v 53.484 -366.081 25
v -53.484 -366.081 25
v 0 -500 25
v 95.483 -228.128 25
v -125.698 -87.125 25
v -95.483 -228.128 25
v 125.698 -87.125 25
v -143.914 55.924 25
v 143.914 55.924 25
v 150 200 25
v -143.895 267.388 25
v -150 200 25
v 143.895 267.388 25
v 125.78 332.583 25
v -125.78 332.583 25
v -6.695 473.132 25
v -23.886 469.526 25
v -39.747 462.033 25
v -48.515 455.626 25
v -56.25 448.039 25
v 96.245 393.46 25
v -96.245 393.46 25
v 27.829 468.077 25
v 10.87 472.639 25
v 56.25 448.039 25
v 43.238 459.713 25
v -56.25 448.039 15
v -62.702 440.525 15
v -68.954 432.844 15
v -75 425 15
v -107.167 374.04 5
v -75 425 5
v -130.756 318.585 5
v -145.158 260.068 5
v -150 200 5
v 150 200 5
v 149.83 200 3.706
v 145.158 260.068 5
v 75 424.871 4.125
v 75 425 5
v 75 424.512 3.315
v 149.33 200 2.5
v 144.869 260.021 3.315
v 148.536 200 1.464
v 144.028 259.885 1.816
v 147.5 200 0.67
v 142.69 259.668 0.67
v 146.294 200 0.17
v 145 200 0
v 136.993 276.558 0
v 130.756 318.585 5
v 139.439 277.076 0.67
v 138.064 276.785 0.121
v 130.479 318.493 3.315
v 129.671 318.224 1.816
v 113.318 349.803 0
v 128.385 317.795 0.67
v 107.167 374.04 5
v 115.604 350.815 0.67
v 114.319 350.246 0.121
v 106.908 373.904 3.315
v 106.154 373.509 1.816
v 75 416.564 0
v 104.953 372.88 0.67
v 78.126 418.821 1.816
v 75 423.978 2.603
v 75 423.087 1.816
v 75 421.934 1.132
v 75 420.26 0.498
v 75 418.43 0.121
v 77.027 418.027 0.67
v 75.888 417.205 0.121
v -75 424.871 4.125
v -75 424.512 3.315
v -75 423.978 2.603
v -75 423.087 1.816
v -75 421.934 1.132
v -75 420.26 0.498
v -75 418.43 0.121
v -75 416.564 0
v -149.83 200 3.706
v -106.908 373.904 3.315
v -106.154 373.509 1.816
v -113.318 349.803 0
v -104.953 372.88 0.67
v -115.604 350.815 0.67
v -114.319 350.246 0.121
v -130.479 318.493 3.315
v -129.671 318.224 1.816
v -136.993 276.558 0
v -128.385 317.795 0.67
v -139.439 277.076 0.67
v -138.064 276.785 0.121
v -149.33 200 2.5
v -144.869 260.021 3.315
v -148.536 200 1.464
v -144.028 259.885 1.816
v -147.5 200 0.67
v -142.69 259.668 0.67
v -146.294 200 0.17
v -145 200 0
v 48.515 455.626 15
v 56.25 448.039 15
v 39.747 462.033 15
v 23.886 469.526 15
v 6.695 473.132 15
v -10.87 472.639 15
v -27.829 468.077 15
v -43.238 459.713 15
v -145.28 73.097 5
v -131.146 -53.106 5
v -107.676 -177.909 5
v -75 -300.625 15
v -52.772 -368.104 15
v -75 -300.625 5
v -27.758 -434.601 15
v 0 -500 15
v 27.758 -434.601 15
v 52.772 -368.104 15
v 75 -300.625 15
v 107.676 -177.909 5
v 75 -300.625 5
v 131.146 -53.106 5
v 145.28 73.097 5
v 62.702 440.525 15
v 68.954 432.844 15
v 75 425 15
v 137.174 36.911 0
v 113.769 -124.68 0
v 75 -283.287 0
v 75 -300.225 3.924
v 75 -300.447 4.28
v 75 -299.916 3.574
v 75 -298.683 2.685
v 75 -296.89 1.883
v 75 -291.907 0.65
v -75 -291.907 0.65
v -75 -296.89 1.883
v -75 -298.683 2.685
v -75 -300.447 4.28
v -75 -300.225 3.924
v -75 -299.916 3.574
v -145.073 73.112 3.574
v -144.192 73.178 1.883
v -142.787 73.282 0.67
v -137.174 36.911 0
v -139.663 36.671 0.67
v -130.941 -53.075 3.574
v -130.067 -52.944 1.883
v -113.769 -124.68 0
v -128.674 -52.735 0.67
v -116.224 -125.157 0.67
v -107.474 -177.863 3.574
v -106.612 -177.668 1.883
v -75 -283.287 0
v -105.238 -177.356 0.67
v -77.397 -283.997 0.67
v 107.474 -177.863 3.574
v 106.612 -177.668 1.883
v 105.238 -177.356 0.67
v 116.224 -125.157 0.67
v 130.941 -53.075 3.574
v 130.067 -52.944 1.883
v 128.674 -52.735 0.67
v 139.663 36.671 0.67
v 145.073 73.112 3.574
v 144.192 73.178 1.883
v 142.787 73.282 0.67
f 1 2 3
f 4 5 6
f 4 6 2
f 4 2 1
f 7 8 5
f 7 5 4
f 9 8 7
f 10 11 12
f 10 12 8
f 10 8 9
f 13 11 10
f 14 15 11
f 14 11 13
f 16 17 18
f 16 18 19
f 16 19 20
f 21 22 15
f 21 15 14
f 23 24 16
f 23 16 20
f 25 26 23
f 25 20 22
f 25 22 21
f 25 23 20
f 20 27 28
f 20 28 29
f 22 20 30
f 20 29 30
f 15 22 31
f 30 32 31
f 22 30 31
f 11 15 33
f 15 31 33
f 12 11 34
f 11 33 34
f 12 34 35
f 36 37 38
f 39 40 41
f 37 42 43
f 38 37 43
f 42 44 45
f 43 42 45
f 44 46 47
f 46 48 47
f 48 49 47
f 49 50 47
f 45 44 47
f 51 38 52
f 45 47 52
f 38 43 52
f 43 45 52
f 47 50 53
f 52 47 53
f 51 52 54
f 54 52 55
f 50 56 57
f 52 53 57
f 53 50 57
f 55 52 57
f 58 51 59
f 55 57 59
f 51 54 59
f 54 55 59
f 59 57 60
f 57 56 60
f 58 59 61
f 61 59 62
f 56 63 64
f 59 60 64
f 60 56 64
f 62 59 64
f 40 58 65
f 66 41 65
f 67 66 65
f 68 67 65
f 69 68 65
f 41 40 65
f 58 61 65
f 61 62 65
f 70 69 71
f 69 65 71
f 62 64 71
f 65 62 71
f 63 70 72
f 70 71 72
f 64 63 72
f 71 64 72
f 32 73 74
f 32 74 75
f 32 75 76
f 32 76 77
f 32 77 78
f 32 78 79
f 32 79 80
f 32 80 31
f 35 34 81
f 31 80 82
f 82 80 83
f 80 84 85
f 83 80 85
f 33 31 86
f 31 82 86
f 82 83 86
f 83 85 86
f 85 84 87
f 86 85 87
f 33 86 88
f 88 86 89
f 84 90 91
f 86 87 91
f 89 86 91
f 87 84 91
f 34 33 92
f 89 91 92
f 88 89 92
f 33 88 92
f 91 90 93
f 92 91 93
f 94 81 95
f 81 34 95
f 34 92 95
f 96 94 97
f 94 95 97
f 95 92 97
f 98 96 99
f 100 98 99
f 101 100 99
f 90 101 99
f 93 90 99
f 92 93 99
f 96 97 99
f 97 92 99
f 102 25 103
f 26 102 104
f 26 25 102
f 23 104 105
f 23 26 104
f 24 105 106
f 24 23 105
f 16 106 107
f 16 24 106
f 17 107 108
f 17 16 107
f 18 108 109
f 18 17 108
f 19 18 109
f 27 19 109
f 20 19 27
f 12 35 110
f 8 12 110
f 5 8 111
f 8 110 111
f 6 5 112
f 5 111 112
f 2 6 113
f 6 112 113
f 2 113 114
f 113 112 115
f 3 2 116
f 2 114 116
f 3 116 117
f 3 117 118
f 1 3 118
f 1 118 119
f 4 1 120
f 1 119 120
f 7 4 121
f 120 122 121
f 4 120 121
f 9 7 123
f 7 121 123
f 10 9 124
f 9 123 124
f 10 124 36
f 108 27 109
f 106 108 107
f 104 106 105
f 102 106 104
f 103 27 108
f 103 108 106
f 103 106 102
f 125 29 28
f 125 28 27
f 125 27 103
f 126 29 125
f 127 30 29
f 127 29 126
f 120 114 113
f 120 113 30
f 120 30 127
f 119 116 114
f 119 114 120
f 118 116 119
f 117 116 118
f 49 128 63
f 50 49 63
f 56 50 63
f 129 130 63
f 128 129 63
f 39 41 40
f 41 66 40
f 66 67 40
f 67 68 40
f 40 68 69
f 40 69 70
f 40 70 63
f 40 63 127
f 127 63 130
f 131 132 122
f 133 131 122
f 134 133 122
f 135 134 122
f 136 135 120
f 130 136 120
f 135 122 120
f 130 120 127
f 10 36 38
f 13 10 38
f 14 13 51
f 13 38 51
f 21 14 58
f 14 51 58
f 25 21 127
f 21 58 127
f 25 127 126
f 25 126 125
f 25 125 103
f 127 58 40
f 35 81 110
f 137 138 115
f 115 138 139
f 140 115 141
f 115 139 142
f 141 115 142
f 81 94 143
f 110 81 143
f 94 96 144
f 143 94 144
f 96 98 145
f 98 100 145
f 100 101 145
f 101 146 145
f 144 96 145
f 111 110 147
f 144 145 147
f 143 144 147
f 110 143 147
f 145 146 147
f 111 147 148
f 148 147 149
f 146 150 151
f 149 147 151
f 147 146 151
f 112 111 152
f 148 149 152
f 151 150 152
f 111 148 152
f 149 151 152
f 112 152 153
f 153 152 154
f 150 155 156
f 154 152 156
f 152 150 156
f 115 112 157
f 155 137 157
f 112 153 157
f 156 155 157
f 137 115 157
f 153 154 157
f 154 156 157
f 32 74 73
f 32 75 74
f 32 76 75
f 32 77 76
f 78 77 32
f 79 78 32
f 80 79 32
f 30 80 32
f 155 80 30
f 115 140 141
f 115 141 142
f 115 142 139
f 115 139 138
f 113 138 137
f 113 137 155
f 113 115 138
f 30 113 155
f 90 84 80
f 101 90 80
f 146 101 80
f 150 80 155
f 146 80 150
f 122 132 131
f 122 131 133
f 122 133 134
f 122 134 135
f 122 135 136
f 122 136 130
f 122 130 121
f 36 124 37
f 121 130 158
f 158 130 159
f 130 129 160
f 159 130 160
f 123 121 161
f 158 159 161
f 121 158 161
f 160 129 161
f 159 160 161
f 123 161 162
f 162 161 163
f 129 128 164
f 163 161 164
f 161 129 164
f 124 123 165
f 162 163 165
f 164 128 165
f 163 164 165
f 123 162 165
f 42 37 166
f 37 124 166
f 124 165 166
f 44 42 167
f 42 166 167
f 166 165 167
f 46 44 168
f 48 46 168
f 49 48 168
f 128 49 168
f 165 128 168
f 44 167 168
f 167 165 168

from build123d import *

# Parameters (mm, degrees)
F1_DEPTH      = 25
F2_R          = 75
F3_R          = 5
F4_W          = 150
F4_H          = 30
F5_DEPTH      = 473.4323484298
F5_DEPTH_BACK = 500.0010001


with BuildPart() as f1:
    # F0 (on Top) → F1 (new body)
    with BuildSketch(Plane.XY):
        with BuildLine():
            ThreePointArc((150, 200), (110.410196625, 367.7050983125), (0, 500))
            ThreePointArc((0, 500), (-110.410196625, 367.7050983125), (-150, 200))
            ThreePointArc((-150, 200), (-112.0791240489, -157.9455265819), (0, -500))
            ThreePointArc((0, -500), (112.0791240489, -157.9455265819), (150, 200))
        make_face()
    extrude(amount=F1_DEPTH)

    # F2
    f2_edges = [f1.edges().sort_by_distance(p)[0] for p in [
        (0, 500, 12.5),
    ]]
    fillet(f2_edges, radius=F2_R)

    # F3
    f3_edges = [f1.edges().sort_by_distance(p)[0] for p in [
        (125.78038, 332.582521, 0),
        (0, 473.431348, 0),
        (112.079124, -157.945527, 0),
        (-125.78038, 332.582521, 0),
        (-112.079124, -157.945527, 0),
    ]]
    fillet(f3_edges, radius=F3_R)

    # F4 (on Front) → F5 (cut, two sides)
    with BuildSketch(Plane.XZ) as f5_sk:
        Rectangle(F4_W, F4_H)
    extrude(amount=-F5_DEPTH, mode=Mode.SUBTRACT)
    extrude(f5_sk.sketch, amount=F5_DEPTH_BACK, mode=Mode.SUBTRACT)


solid = f1.part
